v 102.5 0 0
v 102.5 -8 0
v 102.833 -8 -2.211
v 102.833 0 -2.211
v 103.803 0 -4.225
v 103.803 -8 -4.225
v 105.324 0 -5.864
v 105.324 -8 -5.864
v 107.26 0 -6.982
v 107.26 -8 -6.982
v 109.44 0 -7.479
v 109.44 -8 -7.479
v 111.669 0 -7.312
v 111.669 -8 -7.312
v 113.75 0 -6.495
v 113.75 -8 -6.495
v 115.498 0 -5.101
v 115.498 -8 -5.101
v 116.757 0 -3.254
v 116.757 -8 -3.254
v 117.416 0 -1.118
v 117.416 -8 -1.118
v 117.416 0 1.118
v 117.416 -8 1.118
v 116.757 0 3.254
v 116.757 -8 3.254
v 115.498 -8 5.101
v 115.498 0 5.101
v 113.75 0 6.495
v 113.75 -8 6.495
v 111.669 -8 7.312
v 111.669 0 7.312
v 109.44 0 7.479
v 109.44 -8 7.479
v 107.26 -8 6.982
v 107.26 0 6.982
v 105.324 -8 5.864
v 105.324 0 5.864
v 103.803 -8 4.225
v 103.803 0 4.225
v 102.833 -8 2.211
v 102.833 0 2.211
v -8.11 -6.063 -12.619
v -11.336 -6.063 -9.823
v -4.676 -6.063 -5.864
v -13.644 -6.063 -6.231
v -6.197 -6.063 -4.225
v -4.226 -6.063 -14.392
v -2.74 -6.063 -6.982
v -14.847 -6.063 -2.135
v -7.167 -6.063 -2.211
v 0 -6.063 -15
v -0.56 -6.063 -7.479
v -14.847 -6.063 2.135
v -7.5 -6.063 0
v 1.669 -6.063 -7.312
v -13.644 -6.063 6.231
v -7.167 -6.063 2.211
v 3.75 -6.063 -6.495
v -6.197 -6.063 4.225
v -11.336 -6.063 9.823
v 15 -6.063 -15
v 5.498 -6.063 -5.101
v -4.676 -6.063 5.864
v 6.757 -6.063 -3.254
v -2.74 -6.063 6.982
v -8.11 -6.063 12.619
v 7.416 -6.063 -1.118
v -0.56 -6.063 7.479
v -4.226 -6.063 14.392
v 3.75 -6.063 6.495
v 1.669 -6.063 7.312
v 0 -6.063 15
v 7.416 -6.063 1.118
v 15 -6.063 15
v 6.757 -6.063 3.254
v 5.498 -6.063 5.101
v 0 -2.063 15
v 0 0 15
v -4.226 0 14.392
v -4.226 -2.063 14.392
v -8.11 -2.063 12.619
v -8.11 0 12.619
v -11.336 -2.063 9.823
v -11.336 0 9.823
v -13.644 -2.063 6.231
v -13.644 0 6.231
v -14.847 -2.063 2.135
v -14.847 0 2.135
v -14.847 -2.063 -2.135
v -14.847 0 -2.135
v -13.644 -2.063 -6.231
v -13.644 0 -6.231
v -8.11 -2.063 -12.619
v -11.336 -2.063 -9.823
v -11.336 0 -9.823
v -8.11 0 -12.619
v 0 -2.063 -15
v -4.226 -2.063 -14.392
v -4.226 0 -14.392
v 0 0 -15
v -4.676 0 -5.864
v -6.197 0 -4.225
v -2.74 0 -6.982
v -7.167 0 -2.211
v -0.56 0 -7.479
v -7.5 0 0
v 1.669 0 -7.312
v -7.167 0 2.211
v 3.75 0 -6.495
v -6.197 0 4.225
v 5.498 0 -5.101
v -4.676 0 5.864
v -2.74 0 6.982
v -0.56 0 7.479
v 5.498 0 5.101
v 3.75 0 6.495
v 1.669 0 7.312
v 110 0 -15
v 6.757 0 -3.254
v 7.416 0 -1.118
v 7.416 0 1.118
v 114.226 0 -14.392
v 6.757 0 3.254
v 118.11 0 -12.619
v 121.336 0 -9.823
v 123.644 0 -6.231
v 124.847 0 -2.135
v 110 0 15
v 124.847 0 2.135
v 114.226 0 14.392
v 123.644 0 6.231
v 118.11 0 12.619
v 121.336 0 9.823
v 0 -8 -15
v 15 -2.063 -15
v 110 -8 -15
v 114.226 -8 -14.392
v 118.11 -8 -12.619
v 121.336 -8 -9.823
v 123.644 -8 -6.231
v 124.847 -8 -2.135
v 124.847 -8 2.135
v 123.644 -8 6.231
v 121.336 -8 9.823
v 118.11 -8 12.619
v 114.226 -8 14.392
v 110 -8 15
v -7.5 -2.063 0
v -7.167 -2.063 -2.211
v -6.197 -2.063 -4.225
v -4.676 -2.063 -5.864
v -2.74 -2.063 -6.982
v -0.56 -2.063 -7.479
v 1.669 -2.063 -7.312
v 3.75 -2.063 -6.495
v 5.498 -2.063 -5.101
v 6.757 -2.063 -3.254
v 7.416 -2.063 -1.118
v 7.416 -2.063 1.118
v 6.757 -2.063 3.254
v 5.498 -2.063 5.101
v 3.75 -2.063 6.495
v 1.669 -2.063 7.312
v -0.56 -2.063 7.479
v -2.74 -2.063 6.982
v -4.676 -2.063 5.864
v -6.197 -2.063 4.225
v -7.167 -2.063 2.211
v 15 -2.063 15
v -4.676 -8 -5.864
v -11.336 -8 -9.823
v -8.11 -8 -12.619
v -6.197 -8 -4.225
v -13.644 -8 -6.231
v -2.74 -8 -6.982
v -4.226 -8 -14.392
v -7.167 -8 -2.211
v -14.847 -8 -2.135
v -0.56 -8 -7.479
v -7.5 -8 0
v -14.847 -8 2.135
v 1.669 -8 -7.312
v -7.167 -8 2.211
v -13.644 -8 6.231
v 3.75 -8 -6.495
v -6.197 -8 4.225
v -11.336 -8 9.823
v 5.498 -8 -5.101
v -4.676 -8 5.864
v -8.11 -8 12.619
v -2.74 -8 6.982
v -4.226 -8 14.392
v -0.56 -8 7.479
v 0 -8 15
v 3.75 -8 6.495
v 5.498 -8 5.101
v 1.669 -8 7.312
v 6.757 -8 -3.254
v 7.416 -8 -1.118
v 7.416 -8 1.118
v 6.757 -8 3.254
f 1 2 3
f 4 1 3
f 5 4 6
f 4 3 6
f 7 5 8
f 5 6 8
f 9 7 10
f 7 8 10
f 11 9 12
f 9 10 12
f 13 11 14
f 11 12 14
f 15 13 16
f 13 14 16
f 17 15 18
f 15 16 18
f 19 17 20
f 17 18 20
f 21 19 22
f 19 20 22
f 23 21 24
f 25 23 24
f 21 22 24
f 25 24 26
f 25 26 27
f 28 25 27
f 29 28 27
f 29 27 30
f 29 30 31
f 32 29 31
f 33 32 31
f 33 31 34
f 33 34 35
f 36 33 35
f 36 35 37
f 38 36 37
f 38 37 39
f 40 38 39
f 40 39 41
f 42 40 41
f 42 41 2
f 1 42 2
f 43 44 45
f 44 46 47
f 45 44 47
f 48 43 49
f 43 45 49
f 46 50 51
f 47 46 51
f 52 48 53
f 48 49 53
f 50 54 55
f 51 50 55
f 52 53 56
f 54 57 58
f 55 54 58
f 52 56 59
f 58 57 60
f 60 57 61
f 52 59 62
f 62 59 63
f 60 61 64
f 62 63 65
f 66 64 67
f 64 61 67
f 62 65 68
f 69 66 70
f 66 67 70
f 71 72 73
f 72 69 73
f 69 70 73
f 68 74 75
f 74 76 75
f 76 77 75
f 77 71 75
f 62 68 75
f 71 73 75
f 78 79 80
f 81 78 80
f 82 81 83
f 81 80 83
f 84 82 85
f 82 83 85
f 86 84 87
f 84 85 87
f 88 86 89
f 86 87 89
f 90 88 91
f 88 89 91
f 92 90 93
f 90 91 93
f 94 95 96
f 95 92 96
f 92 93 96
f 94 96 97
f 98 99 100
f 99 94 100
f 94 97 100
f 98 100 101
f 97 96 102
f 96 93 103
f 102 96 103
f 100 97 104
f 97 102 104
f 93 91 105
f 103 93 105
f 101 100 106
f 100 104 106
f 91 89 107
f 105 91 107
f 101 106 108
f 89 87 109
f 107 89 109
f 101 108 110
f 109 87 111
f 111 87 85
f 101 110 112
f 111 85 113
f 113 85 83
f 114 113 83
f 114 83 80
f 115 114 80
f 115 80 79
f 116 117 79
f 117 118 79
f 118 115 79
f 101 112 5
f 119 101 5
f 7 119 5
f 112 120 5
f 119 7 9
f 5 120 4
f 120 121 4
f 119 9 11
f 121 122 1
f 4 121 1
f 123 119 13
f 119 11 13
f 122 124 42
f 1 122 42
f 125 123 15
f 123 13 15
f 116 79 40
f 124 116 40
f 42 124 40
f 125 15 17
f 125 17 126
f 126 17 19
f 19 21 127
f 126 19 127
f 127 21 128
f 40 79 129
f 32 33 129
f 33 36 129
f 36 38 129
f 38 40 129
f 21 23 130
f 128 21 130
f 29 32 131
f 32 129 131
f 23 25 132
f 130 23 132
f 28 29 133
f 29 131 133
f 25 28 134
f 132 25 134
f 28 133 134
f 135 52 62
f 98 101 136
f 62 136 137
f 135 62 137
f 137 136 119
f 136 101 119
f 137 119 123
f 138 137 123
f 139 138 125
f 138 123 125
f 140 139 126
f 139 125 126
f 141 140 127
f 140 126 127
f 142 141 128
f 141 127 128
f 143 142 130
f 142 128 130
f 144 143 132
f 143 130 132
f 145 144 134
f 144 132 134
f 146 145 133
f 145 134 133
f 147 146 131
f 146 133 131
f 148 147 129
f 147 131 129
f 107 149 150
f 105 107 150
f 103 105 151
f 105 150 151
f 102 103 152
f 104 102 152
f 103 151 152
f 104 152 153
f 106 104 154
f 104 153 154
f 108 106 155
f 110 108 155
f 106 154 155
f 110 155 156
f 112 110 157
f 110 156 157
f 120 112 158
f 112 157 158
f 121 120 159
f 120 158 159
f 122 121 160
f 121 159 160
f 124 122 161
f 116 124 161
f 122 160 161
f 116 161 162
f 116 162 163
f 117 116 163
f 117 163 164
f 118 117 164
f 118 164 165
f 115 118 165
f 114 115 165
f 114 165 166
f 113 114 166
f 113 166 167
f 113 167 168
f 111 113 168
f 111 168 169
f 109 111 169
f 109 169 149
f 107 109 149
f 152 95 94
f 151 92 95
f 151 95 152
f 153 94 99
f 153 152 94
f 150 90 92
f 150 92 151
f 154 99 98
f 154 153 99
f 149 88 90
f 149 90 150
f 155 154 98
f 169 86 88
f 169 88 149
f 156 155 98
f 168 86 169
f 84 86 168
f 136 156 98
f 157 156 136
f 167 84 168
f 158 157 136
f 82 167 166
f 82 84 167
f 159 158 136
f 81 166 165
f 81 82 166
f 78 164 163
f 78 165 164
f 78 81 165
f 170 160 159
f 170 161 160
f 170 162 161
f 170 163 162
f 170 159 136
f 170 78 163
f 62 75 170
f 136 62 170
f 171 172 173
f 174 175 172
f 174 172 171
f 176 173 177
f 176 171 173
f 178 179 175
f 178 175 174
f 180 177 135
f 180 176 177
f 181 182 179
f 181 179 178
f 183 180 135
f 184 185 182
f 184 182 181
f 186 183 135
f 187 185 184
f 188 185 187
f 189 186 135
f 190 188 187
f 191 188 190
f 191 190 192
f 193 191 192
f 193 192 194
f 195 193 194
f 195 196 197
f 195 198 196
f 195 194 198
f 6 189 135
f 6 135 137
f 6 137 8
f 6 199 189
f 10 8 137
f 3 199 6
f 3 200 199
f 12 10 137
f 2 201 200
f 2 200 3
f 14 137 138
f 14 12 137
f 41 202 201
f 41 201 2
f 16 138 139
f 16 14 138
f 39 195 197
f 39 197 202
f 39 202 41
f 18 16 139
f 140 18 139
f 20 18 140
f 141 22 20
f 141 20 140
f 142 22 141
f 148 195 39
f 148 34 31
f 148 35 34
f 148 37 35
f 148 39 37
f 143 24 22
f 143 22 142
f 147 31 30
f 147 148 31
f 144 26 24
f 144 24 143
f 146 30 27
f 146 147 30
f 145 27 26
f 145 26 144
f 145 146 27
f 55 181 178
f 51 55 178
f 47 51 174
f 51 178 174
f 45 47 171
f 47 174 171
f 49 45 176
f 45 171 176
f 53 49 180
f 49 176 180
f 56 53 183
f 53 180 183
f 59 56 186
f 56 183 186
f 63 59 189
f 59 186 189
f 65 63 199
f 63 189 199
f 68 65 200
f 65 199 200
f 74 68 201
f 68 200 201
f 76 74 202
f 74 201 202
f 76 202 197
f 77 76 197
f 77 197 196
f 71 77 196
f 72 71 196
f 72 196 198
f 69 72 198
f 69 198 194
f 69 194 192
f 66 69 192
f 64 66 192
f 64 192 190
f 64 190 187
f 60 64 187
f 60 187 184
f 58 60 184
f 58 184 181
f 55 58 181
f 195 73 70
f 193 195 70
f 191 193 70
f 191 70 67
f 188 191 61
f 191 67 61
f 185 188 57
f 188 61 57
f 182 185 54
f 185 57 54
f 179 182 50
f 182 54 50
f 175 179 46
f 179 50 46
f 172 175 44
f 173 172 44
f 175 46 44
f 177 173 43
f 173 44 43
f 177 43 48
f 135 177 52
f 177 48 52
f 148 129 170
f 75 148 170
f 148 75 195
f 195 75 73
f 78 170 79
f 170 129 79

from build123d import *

# Parameters (mm, degrees)
F1_DEPTH = 8
F2_D     = 15
F3_D     = 15
F5_W     = 30
F5_H     = 4
F6_DEPTH = 30.001


with BuildPart() as f1:
    # F0 (on Front) → F1 (new body)
    with BuildSketch(Plane.XZ):
        with BuildLine():
            Line((110, 15), (0, 15))
            ThreePointArc((0, 15), (-15, 0), (0, -15))
            Line((0, -15), (110, -15))
            ThreePointArc((110, -15), (125, 0), (110, 15))
        make_face()
    extrude(amount=F1_DEPTH)

    # F2 (through all)
    with Locations(Plane(origin=(0, 0, 0), x_dir=(1, 0, 0), z_dir=(0, 1, 0))):
        with Locations((0, 0)):
            Hole(F2_D / 2)

    # F3 (through all)
    with Locations(Plane(origin=(0, 0, 0), x_dir=(1, 0, 0), z_dir=(0, 1, 0))):
        with Locations((110, 0)):
            Hole(F3_D / 2)

    # F5 (on offset) → F6 (cut, through all)
    with BuildSketch(Plane.XY.offset(15)):
        with Locations((0, -4.0625976841)):
            Rectangle(F5_W, F5_H)
    extrude(amount=-F6_DEPTH, mode=Mode.SUBTRACT)


solid = f1.part
